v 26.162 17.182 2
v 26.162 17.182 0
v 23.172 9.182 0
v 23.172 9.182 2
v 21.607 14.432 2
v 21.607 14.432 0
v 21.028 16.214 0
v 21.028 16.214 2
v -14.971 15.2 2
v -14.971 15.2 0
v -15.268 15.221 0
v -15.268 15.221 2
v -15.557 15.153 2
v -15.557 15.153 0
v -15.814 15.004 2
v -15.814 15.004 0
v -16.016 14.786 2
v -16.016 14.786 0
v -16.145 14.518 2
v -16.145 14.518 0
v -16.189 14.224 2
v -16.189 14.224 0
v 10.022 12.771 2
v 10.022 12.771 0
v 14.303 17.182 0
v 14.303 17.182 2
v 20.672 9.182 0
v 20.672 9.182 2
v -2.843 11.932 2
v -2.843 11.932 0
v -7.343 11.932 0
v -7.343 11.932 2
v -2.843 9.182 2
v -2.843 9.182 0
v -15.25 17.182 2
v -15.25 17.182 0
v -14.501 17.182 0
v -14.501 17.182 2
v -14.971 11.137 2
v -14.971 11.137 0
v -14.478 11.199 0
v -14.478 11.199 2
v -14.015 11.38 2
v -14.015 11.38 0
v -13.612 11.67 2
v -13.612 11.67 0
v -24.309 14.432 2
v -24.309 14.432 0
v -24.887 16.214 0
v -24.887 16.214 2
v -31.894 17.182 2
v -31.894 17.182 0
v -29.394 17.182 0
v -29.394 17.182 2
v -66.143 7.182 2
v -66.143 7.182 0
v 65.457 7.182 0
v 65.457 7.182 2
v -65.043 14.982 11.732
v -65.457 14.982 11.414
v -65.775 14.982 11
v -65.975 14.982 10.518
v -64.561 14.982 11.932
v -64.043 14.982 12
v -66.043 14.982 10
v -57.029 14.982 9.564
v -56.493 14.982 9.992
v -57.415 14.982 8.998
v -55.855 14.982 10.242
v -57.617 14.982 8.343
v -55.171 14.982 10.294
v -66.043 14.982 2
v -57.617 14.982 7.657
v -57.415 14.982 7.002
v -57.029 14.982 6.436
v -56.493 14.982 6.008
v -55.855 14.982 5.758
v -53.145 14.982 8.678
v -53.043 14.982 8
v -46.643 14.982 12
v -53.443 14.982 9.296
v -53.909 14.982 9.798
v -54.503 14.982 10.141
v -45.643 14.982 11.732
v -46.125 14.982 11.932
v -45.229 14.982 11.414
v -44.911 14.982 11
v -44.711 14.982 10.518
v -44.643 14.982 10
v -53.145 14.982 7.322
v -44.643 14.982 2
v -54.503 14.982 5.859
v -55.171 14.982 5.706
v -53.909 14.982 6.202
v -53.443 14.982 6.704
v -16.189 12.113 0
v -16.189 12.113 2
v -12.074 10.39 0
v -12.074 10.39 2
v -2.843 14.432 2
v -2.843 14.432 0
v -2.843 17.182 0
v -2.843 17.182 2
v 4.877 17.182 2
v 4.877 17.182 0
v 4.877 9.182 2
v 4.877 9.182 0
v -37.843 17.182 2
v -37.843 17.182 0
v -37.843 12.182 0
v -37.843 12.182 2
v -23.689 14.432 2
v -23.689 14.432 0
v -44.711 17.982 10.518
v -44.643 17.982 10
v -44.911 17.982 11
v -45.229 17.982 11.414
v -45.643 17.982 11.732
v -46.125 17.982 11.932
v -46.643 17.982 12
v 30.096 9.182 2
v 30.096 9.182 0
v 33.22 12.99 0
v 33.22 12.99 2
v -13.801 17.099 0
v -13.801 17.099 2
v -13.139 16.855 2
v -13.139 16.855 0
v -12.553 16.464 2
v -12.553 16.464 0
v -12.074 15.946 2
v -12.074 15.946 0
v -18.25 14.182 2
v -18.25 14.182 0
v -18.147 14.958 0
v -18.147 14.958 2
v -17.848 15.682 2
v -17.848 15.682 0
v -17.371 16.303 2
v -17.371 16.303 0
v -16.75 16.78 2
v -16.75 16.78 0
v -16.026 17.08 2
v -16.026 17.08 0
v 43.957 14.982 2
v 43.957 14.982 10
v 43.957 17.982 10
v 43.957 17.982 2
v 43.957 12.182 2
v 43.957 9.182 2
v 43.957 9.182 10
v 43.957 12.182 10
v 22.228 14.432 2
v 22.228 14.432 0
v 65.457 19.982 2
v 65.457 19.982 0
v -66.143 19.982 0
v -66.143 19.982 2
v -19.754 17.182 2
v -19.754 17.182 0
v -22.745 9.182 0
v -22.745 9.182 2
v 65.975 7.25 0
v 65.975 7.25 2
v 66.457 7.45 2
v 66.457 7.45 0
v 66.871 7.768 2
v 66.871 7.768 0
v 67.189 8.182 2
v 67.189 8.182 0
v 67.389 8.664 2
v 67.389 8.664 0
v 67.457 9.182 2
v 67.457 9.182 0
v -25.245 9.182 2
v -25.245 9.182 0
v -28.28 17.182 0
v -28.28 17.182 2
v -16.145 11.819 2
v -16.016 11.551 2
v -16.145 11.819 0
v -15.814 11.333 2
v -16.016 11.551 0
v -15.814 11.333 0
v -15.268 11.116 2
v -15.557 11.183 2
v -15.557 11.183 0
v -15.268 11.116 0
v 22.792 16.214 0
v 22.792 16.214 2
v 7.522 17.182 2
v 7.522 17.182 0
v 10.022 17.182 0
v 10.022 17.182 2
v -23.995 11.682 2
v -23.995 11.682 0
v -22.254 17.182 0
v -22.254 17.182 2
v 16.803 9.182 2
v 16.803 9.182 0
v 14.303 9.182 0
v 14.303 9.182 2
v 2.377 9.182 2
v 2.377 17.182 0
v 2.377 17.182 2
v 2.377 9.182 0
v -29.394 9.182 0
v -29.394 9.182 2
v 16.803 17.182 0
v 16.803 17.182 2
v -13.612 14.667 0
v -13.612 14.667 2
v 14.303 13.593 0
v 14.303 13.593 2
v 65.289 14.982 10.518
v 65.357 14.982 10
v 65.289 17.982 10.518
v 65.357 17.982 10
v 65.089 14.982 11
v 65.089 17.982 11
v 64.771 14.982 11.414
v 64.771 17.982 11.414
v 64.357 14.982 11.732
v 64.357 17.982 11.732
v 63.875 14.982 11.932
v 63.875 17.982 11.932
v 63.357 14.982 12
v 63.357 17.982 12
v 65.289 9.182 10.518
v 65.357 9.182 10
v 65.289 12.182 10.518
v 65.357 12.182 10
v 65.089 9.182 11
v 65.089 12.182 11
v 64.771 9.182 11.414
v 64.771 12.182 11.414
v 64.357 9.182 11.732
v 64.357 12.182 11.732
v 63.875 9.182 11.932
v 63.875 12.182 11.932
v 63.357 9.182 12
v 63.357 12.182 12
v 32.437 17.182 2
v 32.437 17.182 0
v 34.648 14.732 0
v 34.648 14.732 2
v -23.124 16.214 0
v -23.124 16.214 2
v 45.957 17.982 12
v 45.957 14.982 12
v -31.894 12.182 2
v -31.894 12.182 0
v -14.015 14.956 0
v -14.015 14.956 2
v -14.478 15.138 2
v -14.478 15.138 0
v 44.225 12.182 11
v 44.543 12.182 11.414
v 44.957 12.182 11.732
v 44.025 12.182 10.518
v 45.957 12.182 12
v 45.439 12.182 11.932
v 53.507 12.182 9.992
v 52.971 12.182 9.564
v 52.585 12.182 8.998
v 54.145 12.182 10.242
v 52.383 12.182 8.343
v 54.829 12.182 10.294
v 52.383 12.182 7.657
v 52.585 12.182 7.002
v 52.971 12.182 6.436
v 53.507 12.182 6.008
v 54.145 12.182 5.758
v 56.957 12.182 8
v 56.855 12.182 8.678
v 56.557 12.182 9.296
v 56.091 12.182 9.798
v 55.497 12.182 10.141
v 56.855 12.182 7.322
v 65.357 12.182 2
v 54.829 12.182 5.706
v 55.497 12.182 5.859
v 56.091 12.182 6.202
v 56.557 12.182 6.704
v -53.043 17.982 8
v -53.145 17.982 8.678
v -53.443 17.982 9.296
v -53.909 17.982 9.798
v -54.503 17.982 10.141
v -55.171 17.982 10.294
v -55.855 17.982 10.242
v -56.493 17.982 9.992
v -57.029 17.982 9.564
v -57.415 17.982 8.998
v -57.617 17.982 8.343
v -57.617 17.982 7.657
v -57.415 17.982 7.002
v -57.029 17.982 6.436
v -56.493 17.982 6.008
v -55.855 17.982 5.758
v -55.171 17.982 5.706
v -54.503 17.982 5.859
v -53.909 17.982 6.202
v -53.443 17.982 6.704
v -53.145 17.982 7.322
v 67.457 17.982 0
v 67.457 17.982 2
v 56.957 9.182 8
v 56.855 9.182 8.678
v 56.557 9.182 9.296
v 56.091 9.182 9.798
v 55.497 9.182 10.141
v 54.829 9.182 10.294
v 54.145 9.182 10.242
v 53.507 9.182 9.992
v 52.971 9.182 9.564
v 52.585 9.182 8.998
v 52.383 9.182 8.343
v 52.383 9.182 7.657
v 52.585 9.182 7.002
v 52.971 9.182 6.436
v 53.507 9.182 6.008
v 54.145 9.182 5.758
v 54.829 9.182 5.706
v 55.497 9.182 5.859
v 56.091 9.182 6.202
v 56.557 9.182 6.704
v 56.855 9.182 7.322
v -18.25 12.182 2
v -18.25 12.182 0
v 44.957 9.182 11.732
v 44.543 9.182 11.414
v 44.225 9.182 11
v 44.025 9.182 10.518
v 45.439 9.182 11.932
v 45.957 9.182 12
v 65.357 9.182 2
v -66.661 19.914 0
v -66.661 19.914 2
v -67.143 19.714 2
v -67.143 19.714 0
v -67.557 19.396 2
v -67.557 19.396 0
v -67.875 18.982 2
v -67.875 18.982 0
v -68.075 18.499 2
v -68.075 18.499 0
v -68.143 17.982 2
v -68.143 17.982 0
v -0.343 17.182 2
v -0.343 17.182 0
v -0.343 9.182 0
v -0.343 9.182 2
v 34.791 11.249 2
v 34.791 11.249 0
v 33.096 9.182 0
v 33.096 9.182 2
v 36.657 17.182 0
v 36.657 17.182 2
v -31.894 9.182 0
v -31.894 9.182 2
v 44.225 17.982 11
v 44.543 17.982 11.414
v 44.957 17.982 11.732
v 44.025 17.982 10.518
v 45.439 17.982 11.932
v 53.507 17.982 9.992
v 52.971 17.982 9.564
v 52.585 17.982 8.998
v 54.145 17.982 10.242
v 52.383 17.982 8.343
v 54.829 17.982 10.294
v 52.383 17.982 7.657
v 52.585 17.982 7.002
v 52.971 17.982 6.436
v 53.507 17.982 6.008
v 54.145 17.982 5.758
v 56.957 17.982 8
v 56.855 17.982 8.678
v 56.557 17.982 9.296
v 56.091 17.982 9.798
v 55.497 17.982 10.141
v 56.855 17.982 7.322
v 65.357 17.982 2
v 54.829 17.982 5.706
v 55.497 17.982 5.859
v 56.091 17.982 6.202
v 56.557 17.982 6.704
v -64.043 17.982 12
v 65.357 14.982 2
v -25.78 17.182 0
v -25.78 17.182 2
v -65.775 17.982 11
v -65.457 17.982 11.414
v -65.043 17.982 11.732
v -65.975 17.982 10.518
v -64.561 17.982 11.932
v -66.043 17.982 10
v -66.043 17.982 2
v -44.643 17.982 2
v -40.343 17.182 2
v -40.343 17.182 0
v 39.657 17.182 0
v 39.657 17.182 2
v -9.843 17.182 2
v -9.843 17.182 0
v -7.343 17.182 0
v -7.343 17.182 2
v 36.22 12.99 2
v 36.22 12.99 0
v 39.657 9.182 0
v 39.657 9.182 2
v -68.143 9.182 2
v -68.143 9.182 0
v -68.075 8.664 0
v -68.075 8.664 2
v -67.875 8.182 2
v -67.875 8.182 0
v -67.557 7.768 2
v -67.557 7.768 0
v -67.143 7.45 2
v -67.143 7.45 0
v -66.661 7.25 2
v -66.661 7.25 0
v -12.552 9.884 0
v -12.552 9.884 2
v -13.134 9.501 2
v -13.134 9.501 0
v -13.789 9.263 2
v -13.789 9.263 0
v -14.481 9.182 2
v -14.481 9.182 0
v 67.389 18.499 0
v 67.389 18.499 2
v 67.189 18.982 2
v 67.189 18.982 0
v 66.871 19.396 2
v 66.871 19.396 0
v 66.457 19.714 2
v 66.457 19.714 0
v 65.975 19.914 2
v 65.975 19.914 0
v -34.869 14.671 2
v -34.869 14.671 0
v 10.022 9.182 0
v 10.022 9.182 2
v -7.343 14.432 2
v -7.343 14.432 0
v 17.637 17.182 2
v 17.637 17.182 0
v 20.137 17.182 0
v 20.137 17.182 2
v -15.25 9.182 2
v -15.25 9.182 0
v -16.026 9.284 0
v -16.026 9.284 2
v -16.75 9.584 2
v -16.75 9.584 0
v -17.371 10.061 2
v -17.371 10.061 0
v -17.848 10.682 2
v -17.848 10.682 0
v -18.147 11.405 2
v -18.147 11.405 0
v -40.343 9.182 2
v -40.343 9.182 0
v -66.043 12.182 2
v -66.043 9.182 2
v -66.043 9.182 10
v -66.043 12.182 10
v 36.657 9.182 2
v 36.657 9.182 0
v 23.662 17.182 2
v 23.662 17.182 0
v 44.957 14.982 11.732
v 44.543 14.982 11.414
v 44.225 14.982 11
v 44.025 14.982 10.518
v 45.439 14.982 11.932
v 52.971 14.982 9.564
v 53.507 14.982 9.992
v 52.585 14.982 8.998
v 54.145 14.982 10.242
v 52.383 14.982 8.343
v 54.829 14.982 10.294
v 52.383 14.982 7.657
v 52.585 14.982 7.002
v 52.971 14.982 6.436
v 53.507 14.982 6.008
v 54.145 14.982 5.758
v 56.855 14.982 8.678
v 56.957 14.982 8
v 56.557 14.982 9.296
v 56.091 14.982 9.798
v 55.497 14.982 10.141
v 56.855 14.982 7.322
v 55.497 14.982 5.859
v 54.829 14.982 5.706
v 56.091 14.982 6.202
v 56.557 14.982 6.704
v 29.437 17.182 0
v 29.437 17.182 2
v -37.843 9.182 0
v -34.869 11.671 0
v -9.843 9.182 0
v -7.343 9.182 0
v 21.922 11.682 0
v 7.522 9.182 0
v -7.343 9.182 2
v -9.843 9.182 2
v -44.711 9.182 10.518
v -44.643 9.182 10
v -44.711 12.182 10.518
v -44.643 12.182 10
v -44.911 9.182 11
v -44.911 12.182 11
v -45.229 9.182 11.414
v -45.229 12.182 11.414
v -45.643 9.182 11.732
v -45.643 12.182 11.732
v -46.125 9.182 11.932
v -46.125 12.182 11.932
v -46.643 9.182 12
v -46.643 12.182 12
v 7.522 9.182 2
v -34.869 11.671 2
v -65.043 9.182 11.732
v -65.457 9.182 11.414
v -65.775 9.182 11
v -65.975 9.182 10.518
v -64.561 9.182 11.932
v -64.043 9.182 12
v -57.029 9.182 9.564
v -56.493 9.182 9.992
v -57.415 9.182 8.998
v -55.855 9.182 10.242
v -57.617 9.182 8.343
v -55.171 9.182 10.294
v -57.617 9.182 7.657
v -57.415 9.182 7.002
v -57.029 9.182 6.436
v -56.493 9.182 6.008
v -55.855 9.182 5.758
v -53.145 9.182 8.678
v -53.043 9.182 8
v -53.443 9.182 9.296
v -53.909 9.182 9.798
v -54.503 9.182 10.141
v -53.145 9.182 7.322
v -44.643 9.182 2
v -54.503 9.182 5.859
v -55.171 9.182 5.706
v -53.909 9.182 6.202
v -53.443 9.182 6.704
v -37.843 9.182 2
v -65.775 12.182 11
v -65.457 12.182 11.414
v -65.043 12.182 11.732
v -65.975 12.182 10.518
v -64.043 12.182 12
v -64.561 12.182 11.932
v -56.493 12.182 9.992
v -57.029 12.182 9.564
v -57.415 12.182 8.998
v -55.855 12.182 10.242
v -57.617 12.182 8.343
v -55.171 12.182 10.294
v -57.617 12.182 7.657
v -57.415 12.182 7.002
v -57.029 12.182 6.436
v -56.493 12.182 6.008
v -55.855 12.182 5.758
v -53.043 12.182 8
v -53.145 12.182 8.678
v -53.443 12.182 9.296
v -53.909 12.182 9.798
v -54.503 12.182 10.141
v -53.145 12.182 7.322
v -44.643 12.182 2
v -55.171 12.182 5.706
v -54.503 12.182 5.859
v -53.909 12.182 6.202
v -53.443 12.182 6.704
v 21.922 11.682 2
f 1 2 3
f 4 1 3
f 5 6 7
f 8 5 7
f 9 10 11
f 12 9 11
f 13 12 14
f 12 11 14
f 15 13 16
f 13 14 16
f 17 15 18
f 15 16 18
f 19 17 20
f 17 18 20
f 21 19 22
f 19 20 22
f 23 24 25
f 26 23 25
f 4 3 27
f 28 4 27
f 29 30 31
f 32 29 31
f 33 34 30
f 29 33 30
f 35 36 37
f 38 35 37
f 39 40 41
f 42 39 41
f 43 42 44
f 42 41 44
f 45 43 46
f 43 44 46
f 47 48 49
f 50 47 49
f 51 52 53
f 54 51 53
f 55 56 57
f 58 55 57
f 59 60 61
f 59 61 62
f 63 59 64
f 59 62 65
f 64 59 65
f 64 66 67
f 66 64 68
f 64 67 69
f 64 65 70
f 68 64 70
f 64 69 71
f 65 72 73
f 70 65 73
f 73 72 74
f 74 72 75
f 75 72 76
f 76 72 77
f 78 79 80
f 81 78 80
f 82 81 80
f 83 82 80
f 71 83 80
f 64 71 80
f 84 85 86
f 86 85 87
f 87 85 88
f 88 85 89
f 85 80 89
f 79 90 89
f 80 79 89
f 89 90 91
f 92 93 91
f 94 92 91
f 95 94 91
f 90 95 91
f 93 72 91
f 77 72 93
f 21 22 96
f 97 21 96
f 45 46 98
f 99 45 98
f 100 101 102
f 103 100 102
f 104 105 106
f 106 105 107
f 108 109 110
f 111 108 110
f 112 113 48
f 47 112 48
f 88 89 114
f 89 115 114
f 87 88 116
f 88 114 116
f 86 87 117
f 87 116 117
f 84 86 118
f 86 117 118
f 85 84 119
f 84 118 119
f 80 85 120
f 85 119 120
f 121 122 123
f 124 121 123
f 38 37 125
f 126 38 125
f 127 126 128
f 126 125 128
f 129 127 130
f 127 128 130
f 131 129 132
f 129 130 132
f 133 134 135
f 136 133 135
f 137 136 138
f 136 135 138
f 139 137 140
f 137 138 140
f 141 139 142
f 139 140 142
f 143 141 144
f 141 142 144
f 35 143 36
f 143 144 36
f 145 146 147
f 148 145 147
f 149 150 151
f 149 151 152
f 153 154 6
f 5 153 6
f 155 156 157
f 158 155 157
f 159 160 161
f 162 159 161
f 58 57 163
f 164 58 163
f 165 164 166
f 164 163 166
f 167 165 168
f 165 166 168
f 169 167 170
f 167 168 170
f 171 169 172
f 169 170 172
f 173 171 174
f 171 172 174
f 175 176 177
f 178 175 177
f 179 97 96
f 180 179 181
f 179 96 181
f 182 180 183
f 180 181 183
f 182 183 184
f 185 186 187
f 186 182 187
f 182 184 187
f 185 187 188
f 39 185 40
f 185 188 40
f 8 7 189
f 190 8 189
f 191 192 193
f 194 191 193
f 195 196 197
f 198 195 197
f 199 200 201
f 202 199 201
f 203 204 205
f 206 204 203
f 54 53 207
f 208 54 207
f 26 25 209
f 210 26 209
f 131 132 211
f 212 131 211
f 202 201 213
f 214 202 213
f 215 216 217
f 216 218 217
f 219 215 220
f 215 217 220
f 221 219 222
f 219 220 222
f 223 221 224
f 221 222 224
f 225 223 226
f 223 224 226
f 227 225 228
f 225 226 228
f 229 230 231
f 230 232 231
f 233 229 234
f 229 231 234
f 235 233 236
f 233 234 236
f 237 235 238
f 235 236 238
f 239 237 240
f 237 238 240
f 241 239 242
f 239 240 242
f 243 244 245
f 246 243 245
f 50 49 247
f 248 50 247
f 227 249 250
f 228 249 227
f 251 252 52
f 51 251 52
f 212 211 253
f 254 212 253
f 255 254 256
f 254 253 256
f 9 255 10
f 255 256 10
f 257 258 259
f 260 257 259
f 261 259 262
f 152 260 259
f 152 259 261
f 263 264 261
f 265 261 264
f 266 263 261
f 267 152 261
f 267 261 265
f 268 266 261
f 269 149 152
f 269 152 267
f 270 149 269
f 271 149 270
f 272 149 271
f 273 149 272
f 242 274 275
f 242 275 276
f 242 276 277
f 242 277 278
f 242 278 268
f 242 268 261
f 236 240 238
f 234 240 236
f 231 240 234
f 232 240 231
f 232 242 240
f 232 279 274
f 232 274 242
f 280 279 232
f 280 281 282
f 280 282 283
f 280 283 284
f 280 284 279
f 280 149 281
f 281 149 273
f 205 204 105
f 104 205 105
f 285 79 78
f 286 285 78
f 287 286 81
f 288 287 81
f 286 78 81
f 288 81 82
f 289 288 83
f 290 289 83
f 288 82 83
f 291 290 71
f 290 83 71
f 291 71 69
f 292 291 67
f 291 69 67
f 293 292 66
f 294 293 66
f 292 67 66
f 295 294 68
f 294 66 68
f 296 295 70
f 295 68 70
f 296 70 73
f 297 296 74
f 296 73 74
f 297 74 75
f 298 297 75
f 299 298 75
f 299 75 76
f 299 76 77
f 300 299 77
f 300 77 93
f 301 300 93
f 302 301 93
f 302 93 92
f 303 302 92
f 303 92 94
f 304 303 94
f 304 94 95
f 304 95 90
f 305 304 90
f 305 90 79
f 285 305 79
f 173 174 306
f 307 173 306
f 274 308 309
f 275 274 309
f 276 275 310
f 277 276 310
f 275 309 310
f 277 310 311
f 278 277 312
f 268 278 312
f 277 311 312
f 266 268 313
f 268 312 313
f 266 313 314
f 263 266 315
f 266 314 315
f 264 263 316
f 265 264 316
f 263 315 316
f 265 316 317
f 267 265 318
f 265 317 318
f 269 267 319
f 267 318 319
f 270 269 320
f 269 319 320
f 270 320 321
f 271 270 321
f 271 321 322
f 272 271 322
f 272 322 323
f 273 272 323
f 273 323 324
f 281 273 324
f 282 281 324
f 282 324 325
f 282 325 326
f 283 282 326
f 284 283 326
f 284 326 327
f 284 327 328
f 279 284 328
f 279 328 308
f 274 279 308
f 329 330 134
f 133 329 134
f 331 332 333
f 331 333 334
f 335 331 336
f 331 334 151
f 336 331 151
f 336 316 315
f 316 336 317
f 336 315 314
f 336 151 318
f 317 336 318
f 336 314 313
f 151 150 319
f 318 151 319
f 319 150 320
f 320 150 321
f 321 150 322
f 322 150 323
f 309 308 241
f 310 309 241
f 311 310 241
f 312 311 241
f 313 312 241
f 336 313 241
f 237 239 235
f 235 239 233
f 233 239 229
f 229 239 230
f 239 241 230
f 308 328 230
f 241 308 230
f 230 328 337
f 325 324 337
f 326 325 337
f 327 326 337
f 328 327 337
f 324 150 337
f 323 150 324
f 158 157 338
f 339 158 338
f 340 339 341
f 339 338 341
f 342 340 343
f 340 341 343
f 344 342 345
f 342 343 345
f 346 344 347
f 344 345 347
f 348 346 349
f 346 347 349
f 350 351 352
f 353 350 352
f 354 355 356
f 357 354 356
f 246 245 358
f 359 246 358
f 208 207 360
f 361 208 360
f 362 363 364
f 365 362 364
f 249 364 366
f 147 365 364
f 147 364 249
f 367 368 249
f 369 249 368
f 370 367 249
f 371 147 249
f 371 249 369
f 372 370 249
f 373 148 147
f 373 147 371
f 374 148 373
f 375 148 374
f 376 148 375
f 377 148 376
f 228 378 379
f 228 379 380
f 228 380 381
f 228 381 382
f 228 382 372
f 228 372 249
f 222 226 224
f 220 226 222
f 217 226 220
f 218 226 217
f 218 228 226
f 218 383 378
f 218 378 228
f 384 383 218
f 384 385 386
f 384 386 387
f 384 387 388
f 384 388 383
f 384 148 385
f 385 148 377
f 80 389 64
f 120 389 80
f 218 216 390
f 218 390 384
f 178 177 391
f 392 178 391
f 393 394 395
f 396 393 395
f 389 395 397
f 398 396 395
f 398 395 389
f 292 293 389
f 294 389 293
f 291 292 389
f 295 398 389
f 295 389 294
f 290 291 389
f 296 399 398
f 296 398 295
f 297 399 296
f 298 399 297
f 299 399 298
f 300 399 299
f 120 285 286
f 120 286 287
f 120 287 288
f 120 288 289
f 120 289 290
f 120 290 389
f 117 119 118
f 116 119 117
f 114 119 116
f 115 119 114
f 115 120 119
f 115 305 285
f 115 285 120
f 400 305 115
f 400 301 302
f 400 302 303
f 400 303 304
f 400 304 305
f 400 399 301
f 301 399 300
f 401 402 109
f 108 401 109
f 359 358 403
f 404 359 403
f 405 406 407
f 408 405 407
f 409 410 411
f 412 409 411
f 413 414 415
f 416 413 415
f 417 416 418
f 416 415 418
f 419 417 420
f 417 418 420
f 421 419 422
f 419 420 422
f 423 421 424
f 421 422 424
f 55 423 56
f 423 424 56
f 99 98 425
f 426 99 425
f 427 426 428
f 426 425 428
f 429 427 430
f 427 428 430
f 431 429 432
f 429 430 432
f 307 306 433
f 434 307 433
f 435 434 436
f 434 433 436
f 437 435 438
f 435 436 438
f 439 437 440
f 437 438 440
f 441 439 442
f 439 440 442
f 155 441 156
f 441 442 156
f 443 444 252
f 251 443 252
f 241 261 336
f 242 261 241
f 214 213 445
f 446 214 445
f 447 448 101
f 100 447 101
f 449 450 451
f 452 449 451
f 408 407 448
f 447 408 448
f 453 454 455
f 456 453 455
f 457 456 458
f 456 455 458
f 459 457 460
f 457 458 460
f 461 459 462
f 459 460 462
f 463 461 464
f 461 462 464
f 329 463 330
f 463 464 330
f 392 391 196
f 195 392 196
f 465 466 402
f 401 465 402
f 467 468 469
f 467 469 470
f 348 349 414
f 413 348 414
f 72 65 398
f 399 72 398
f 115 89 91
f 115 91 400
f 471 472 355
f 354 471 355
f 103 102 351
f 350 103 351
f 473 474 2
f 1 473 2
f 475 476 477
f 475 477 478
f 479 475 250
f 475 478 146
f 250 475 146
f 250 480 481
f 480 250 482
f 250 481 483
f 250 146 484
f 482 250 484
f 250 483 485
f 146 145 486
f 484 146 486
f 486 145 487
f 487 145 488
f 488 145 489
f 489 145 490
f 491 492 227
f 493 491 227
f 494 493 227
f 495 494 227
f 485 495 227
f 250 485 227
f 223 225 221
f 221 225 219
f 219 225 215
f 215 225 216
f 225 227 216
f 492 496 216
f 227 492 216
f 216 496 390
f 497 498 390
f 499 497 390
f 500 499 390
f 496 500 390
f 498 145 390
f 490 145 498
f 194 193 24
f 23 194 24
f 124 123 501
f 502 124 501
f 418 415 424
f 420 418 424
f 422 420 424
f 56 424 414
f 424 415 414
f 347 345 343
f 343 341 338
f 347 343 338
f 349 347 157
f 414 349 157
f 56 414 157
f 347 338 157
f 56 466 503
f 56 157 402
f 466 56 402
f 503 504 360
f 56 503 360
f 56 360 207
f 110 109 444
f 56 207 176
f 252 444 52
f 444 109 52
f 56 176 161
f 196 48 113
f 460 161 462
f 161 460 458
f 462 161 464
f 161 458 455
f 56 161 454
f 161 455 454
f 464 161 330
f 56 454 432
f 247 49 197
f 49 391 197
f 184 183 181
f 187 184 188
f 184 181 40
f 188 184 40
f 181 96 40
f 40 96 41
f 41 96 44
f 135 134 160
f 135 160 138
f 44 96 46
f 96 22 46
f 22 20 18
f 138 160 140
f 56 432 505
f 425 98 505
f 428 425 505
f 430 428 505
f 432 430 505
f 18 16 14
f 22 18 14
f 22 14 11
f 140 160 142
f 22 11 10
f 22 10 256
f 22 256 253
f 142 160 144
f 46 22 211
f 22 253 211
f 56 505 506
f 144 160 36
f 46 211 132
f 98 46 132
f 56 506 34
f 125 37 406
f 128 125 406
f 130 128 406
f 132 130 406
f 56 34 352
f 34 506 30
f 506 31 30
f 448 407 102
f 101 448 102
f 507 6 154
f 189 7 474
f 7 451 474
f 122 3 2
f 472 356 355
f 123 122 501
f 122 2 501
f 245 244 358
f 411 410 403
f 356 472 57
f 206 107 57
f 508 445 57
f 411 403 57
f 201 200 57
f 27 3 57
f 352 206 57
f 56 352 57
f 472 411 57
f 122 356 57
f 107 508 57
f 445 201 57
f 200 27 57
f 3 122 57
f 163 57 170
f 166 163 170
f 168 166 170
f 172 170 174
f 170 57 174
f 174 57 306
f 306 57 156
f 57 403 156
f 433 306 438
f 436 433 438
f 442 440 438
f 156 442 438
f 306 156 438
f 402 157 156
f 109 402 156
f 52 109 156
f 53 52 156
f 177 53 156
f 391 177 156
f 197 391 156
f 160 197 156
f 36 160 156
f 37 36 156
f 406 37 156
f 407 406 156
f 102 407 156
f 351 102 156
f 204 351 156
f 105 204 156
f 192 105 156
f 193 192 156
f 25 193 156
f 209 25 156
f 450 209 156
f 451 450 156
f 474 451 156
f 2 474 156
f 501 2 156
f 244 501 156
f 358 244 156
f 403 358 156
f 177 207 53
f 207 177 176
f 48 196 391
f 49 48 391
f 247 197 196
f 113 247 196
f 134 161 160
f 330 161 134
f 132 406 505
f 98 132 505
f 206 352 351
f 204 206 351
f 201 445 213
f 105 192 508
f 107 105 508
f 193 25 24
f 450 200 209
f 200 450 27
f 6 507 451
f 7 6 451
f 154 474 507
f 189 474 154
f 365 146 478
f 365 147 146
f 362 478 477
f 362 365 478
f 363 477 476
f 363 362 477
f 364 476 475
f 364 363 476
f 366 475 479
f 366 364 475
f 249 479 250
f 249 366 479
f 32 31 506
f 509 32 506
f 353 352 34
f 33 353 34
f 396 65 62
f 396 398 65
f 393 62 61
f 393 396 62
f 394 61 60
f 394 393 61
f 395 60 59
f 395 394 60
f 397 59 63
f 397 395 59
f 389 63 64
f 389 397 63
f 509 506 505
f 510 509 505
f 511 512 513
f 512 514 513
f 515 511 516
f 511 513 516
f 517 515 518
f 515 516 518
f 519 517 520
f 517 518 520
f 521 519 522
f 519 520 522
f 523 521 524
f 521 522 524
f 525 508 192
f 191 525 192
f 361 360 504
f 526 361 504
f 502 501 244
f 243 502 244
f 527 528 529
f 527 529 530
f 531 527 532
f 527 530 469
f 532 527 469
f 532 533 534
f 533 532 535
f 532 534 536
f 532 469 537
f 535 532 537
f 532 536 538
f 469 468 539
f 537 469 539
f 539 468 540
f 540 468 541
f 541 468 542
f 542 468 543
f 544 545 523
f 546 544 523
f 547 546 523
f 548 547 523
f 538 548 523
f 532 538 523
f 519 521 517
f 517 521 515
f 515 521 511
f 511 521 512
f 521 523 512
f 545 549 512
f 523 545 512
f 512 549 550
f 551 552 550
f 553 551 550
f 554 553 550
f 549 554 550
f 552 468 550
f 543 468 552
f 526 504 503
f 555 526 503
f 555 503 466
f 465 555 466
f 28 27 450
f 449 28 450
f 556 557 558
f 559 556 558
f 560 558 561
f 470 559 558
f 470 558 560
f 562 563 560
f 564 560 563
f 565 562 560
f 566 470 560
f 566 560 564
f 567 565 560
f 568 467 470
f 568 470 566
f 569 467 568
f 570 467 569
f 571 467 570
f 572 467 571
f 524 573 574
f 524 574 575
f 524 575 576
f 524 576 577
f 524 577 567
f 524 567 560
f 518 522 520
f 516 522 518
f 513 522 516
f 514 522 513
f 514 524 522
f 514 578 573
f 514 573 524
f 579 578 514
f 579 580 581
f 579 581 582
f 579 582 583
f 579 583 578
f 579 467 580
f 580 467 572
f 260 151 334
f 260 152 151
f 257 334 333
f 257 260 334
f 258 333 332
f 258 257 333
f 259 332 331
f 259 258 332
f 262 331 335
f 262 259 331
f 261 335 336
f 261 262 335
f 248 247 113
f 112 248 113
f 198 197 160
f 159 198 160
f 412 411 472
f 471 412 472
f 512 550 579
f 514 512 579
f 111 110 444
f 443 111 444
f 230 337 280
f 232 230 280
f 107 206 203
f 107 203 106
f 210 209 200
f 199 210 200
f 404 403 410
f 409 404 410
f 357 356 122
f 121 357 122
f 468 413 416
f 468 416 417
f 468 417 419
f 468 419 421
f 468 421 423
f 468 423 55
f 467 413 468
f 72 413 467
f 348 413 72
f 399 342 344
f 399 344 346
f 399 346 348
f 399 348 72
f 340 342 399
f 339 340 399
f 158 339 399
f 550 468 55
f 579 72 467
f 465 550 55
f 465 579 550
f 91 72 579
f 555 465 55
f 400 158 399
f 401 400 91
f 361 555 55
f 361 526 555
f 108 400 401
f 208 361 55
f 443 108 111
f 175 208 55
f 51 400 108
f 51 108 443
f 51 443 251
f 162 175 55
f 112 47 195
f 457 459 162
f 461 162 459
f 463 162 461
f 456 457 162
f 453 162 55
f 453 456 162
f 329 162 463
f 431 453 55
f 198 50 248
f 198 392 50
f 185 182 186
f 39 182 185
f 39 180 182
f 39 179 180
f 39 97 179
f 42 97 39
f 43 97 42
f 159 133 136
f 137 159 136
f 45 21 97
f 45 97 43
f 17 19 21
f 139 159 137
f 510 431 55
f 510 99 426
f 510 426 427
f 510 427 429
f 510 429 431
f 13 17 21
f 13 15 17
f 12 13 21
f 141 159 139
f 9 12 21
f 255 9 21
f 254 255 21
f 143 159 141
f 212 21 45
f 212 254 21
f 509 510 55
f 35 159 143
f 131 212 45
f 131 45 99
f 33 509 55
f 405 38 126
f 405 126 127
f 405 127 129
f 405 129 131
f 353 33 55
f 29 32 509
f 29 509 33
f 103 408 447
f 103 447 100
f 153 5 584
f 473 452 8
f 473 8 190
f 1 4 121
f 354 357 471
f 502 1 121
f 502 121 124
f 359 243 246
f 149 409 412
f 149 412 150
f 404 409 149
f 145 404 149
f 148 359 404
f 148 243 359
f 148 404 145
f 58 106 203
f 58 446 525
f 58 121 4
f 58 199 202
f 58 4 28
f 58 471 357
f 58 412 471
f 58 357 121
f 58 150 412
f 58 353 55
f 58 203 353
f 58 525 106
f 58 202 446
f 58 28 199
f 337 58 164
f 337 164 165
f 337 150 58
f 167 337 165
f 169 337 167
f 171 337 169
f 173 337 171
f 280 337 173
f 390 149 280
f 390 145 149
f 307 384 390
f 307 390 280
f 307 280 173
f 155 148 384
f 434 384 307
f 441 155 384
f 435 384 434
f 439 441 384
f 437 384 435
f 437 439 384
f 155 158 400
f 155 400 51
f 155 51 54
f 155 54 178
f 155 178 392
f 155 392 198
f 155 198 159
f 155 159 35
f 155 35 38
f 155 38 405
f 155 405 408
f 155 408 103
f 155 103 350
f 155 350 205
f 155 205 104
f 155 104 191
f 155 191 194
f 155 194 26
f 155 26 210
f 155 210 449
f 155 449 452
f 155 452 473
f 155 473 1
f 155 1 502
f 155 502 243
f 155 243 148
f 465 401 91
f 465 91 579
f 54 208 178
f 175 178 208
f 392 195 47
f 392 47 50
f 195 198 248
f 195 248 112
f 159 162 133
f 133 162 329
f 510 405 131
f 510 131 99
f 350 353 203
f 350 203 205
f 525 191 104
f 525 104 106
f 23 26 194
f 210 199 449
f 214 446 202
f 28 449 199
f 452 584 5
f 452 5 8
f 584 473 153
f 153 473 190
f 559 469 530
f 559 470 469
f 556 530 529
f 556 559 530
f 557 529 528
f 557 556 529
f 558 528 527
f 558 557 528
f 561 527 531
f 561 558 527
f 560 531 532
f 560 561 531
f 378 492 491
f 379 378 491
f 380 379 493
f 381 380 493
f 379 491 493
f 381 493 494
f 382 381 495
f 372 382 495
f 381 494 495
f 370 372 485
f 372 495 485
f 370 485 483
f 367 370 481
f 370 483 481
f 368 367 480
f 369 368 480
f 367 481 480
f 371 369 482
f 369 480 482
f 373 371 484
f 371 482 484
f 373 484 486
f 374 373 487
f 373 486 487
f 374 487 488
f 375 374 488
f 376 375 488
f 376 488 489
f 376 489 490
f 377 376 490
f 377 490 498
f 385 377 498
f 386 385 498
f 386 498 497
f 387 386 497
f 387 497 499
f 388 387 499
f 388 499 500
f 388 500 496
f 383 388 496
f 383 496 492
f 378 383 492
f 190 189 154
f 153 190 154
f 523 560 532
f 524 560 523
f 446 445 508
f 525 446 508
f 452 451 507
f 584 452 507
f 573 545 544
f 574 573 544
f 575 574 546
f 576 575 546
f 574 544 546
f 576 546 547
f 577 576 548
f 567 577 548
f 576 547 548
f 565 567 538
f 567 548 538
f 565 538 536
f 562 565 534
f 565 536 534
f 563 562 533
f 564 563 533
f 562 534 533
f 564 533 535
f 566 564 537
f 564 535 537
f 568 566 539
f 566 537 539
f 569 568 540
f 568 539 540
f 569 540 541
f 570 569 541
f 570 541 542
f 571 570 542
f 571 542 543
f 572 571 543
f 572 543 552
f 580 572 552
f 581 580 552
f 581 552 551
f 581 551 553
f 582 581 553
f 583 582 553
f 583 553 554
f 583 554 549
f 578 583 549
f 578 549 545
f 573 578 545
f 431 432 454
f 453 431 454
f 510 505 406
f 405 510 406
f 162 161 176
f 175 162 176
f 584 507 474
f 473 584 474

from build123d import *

# Parameters (mm, degrees)
F1_DEPTH = 2
F2_W     = 21.4
F2_H     = 3
F3_DEPTH = 10
F4_R     = 2
F5_R     = 2.3
F6_DEPTH = 25
F7_W     = 2.5
F7_H     = 8
F8_DEPTH = 25


with BuildPart() as f1:
    # F0 (on Top) → F1 (new body)
    with BuildSketch(Plane.XY):
        with BuildLine():
            Line((65.45691, 19.981824), (-66.14309, 19.981824))
            ThreePointArc((-66.14309, 19.981824), (-67.557303, 19.396037), (-68.14309, 17.981824))
            Line((-68.14309, 17.981824), (-68.14309, 9.181824))
            ThreePointArc((-68.14309, 9.181824), (-67.557303, 7.76761), (-66.14309, 7.181824))
            Line((-66.14309, 7.181824), (65.45691, 7.181824))
            ThreePointArc((65.45691, 7.181824), (66.871124, 7.76761), (67.45691, 9.181824))
            Line((67.45691, 9.181824), (67.45691, 17.981824))
            ThreePointArc((67.45691, 17.981824), (66.871124, 19.396037), (65.45691, 19.981824))
        make_face()
    extrude(amount=F1_DEPTH)

    # F2 (on face) → F3 (join)
    with BuildSketch(Plane.XY.offset(2)):
        with Locations((-55.34309, 10.681824)):
            Rectangle(F2_W, F2_H)
        with Locations((-55.34309, 16.481824)):
            Rectangle(F2_W, F2_H)
        with Locations((54.65691, 16.481824)):
            Rectangle(F2_W, F2_H)
        with Locations((54.65691, 10.681824)):
            Rectangle(F2_W, F2_H)
    extrude(amount=F3_DEPTH)

    # F4
    f4_edges = [f1.edges().sort_by_distance(p)[0] for p in [
        (-66.04309, 16.481824, 12),
        (-66.04309, 10.681824, 12),
        (-44.64309, 16.481824, 12),
        (-44.64309, 10.681824, 12),
        (43.95691, 16.481824, 12),
        (65.35691, 16.481824, 12),
        (65.35691, 10.681824, 12),
        (43.95691, 10.681824, 12),
    ]]
    fillet(f4_edges, radius=F4_R)

    # F5 (on face) → F6 (cut)
    with BuildSketch(Plane.XZ.offset(-9.181824)):
        with Locations((-55.34309, 8)):
            Circle(F5_R)
        with Locations((54.65691, 8)):
            Circle(F5_R)
    extrude(amount=-F6_DEPTH, mode=Mode.SUBTRACT)

    # F7 (on face) → F8 (cut)
    with BuildSketch(Plane(origin=(0, 0, 0), x_dir=(1, 0, 0), z_dir=(0, 0, -1))):
        Polygon((-37.84309, -9.181824), (-40.34309, -9.181824), (-40.34309, -17.181824), (-37.84309, -17.181824), (-37.84309, -12.181824), (-34.868522, -14.671218), (-31.893954, -12.181824), (-31.893954, -17.181824), (-29.393954, -17.181824), (-29.393954, -9.181824), (-31.893954, -9.181824), (-34.868522, -11.671218), align=None)
        Polygon((-25.244718, -9.181824), (-28.279638, -17.181824), (-25.779638, -17.181824), (-23.994718, -11.681824), (-22.25427, -17.181824), (-19.75427, -17.181824), (-22.744718, -9.181824), align=None)
        Polygon((-24.308708, -14.431824), (-24.887178, -16.214306), (-23.124494, -16.214306), (-23.688552, -14.431824), align=None)
        with BuildLine():
            ThreePointArc((-15.24951, -9.181824), (-17.37083, -10.060503), (-18.24951, -12.181824))
            Line((-18.24951, -12.181824), (-18.24951, -14.181824))
            ThreePointArc((-18.24951, -14.181824), (-17.37083, -16.303144), (-15.24951, -17.181824))
            Line((-15.24951, -17.181824), (-14.500879, -17.181824))
            ThreePointArc((-14.500879, -17.181824), (-13.139405, -16.855097), (-12.074485, -15.946083))
            Line((-12.074485, -15.946083), (-13.611591, -14.666511))
            ThreePointArc((-13.611591, -14.666511), (-14.240961, -15.06161), (-14.971134, -15.199663))
            ThreePointArc((-14.971134, -15.199663), (-15.814263, -15.003944), (-16.18885, -14.223651))
            Line((-16.18885, -14.223651), (-16.18885, -12.112802))
            ThreePointArc((-16.18885, -12.112802), (-15.814263, -11.332509), (-14.971134, -11.13679))
            ThreePointArc((-14.971134, -11.13679), (-14.240961, -11.274843), (-13.611591, -11.669942))
            Line((-13.611591, -11.669942), (-12.074485, -10.39037))
            ThreePointArc((-12.074485, -10.39037), (-13.134461, -9.500932), (-14.480871, -9.181824))
            Line((-14.480871, -9.181824), (-15.24951, -9.181824))
        make_face()
        Polygon((-7.34309, -9.181824), (-9.84309, -9.181824), (-9.84309, -17.181824), (-7.34309, -17.181824), (-7.34309, -14.431824), (-2.84309, -14.431824), (-2.84309, -17.181824), (-0.34309, -17.181824), (-0.34309, -9.181824), (-2.84309, -9.181824), (-2.84309, -11.931824), (-7.34309, -11.931824), align=None)
        with Locations((3.627188, -13.181824)):
            Rectangle(F7_W, F7_H)
        Polygon((10.021806, -9.181824), (7.521806, -9.181824), (7.521806, -17.181824), (10.021806, -17.181824), (10.021806, -12.771093), (14.303348, -17.181824), (16.803348, -17.181824), (16.803348, -9.181824), (14.303348, -9.181824), (14.303348, -13.592554), align=None)
        Polygon((20.67196, -9.181824), (17.637041, -17.181824), (20.137041, -17.181824), (21.92196, -11.681824), (23.662409, -17.181824), (26.162409, -17.181824), (23.17196, -9.181824), align=None)
        Polygon((21.0282, -16.214306), (22.792184, -16.214306), (22.228127, -14.431824), (21.60667, -14.431824), align=None)
        Polygon((33.219673, -12.990384), (29.436884, -17.181824), (32.436884, -17.181824), (34.647883, -14.731973), (36.65691, -17.181824), (39.65691, -17.181824), (36.219673, -12.990384), (39.65691, -9.181824), (36.65691, -9.181824), (34.791463, -11.248794), (33.09642, -9.181824), (30.09642, -9.181824), align=None)
    extrude(amount=-F8_DEPTH, mode=Mode.SUBTRACT)


solid = f1.part
